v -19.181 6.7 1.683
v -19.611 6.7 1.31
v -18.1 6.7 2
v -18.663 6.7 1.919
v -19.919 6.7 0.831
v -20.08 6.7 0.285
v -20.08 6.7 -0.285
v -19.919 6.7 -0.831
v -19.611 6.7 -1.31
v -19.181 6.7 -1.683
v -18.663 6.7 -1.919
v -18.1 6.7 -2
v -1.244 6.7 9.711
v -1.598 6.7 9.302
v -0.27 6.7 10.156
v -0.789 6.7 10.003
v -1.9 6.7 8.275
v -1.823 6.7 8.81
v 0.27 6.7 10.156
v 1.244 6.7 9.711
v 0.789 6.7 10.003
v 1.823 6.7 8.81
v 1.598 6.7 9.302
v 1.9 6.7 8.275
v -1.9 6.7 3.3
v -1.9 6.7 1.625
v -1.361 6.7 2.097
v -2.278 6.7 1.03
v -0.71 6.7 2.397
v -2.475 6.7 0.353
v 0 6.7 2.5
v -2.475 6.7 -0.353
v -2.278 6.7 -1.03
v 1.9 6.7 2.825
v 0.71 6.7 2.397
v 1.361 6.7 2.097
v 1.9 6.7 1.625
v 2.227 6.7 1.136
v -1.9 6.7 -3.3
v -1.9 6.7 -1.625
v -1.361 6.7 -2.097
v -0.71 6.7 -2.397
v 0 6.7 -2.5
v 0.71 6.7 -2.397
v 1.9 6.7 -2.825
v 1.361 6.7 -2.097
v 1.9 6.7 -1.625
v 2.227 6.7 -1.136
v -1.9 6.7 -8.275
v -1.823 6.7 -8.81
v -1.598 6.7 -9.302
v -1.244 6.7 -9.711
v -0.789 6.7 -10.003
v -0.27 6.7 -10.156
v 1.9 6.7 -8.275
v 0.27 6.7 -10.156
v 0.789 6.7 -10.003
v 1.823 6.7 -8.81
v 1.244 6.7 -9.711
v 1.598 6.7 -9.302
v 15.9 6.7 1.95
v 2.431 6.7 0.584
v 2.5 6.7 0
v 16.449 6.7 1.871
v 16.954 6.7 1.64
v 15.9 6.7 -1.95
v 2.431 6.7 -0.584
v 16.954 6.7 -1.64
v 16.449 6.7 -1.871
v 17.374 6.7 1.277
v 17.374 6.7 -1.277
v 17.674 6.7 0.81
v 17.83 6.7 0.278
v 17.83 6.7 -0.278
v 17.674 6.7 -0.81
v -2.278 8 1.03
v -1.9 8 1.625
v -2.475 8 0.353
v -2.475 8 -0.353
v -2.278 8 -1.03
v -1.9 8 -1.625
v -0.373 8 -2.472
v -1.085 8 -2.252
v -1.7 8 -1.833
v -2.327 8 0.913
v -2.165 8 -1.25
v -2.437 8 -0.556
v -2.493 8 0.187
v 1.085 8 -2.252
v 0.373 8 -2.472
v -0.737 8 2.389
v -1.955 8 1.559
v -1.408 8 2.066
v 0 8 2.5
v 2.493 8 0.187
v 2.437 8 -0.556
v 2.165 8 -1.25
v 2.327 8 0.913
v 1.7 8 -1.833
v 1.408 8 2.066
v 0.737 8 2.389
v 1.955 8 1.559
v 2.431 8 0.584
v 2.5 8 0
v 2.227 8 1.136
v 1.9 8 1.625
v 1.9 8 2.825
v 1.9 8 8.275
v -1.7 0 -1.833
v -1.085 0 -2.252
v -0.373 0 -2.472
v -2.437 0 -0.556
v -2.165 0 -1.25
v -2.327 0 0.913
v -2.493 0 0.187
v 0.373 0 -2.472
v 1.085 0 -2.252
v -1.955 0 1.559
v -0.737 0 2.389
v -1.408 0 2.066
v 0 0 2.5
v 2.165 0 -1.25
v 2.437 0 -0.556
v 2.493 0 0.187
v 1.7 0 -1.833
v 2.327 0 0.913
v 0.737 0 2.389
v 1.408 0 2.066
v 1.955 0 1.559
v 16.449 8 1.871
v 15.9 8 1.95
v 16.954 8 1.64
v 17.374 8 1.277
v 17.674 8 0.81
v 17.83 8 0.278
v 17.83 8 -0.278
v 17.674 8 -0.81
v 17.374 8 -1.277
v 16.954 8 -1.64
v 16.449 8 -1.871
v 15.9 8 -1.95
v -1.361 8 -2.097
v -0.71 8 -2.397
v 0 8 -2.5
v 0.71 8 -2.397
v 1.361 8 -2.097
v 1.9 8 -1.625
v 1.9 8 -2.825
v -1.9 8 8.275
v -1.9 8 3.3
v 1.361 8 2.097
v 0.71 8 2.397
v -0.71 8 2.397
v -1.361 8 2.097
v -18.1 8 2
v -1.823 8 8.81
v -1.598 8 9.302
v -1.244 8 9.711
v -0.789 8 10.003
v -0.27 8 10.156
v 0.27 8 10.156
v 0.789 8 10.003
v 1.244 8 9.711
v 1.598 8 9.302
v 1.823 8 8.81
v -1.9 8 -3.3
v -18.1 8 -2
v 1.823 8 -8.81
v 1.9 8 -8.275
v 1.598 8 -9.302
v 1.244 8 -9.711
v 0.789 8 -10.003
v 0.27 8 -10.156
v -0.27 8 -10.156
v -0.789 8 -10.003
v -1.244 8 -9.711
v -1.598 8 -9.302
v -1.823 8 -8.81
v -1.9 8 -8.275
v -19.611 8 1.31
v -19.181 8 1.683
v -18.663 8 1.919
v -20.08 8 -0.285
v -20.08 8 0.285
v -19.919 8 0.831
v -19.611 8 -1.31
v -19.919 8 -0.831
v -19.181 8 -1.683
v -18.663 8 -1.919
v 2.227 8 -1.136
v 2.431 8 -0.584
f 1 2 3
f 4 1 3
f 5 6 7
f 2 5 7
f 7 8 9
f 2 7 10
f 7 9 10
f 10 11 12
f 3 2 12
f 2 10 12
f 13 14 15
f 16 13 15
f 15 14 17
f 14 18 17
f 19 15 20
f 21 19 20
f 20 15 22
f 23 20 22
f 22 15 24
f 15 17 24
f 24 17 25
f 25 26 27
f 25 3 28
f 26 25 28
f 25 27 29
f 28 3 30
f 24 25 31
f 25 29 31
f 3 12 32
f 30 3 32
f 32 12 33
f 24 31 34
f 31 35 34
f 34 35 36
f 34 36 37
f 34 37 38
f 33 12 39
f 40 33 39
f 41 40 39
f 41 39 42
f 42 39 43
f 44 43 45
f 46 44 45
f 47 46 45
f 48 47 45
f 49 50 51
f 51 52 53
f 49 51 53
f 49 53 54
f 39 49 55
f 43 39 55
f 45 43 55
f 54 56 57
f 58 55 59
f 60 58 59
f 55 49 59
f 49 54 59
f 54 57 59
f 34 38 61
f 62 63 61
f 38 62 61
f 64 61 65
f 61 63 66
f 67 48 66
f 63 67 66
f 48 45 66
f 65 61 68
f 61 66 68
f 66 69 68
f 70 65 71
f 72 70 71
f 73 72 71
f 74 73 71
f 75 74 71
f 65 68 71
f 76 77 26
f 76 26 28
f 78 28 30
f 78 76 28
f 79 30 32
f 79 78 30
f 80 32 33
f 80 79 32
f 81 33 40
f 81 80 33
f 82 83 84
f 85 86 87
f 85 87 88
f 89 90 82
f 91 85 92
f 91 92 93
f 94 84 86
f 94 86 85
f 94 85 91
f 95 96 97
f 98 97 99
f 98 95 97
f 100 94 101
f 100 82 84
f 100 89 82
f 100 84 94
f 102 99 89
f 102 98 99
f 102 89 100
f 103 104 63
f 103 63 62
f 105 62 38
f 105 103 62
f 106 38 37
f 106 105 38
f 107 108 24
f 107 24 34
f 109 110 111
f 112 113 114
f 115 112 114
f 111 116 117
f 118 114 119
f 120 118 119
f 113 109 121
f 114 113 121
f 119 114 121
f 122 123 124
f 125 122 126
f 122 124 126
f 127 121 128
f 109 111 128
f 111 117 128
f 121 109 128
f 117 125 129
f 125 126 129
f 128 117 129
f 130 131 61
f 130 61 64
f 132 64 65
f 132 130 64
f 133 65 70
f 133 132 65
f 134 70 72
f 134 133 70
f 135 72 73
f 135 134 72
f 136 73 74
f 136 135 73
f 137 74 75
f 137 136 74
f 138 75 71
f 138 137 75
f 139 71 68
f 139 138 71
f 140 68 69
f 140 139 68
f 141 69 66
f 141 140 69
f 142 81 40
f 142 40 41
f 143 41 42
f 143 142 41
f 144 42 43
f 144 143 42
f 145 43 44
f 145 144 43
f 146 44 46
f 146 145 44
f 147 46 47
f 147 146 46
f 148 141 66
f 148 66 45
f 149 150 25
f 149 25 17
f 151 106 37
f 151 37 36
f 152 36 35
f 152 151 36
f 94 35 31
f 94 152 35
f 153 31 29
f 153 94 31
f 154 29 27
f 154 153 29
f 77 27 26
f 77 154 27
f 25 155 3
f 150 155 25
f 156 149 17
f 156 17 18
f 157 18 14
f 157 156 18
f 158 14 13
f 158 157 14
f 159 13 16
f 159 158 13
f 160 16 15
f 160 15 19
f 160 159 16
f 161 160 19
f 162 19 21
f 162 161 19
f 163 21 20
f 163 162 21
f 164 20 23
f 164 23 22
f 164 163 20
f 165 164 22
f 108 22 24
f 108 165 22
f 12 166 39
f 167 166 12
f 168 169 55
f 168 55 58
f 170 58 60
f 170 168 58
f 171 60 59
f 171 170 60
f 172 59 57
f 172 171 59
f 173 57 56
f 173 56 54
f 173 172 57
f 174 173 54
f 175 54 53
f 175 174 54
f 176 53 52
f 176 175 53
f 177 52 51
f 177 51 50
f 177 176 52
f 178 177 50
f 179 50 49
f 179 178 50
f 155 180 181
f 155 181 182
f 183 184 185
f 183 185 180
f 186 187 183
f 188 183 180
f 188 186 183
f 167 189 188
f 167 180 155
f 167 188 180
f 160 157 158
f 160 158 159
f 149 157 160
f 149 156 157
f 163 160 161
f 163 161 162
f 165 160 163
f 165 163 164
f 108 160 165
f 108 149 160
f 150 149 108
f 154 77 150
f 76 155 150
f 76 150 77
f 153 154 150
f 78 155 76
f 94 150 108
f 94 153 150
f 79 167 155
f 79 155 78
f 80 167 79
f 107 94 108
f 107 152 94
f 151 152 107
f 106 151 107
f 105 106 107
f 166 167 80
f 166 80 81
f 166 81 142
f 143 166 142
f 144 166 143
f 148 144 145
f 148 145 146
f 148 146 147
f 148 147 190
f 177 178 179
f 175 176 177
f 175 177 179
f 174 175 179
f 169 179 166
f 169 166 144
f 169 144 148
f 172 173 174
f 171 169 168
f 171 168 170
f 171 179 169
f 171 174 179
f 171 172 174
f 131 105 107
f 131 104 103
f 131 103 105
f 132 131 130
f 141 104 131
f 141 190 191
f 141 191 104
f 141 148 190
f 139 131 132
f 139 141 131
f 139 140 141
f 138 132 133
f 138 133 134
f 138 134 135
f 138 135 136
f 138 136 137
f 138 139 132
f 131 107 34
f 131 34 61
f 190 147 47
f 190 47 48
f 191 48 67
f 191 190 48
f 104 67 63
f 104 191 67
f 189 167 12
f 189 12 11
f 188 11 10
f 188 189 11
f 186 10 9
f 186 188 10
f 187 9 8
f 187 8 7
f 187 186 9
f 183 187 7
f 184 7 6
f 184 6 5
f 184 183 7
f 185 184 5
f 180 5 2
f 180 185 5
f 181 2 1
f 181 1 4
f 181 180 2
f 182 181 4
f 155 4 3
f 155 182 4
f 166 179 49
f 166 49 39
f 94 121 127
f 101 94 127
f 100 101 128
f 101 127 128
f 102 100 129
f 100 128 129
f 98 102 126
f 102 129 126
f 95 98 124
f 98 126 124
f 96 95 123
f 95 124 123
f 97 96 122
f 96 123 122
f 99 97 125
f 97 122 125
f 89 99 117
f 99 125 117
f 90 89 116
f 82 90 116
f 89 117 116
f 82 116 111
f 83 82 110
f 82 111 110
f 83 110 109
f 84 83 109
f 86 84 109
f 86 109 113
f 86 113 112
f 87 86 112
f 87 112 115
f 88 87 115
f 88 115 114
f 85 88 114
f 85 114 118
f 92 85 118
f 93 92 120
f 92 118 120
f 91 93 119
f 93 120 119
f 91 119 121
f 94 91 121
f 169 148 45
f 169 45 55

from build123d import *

# Parameters (mm, degrees)
SKETCH1_R           = 2.5
BOSS_EXTRUDE1_DEPTH = 8
SKETCH2_R           = 2
SKETCH2_R_2         = 1.95
BOSS_EXTRUDE2_DEPTH = 1.3


with BuildPart() as part:
    # Sketch1 → Boss-Extrude1 (new body)
    with BuildSketch(Plane(origin=(0, 0, 0), x_dir=(1, 0, 0), z_dir=(0, 1, 0))):
        with Locations(Location((0, 0, 0), (0, 0, 270))):
            Circle(SKETCH1_R)
    extrude(amount=BOSS_EXTRUDE1_DEPTH)


with BuildPart() as body_2:
    # Sketch2 → Boss-Extrude2 (new body)
    with BuildSketch(Plane(origin=(0, 8, 0), x_dir=(1, 0, 0), z_dir=(0, 1, 0))):
        with Locations((-18.1, 0)):
            Circle(SKETCH2_R)
        with BuildLine():
            ThreePointArc((-1.9, -1.624807681), (-2.5, 0), (-1.9, 1.624807681))
            Line((-1.9, 1.624807681), (-1.9, 3.3))
            Line((-1.9, 3.3), (-18.1, 2))
            ThreePointArc((-18.1, 2), (-16.685786438, 1.414213562), (-16.1, 0))
            ThreePointArc((-16.1, 0), (-16.685786438, -1.414213562), (-18.1, -2))
            Line((-18.1, -2), (-1.9, -3.3))
            Line((-1.9, -3.3), (-1.9, -1.624807681))
        make_face()
        with BuildLine():
            Line((1.9, 1.624807681), (1.9, 2.825))
            Line((1.9, 2.825), (1.9, 8.275))
            ThreePointArc((1.9, 8.275), (0, 6.375), (-1.9, 8.275))
            Line((-1.9, 8.275), (-1.9, 3.3))
            Line((-1.9, 3.3), (-1.9, 1.624807681))
            ThreePointArc((-1.9, 1.624807681), (0, 2.5), (1.9, 1.624807681))
        make_face()
        with BuildLine():
            ThreePointArc((-1.9, 8.275), (0, 6.375), (1.9, 8.275))
            Line((1.9, 8.275), (-1.9, 8.275))
        make_face()
        with BuildLine():
            Line((-1.9, 8.275), (1.9, 8.275))
            ThreePointArc((1.9, 8.275), (0, 10.175), (-1.9, 8.275))
        make_face()
        with BuildLine():
            Line((1.9, -2.825), (1.9, -1.624807681))
            ThreePointArc((1.9, -1.624807681), (0, -2.5), (-1.9, -1.624807681))
            Line((-1.9, -1.624807681), (-1.9, -3.3))
            Line((-1.9, -3.3), (-1.9, -8.275))
            ThreePointArc((-1.9, -8.275), (0, -6.375), (1.9, -8.275))
            Line((1.9, -8.275), (1.9, -2.825))
        make_face()
        with BuildLine():
            ThreePointArc((-1.9, -8.275), (0, -10.175), (1.9, -8.275))
            Line((1.9, -8.275), (-1.9, -8.275))
        make_face()
        with BuildLine():
            Line((-1.9, -8.275), (1.9, -8.275))
            ThreePointArc((1.9, -8.275), (0, -6.375), (-1.9, -8.275))
        make_face()
        with BuildLine():
            Line((15.9, 1.95), (1.9, 2.825))
            Line((1.9, 2.825), (1.9, 1.624807681))
            ThreePointArc((1.9, 1.624807681), (2.34520788, 0.866025404), (2.5, 0))
            ThreePointArc((2.5, 0), (2.34520788, -0.866025404), (1.9, -1.624807681))
            Line((1.9, -1.624807681), (1.9, -2.825))
            Line((1.9, -2.825), (15.9, -1.95))
            ThreePointArc((15.9, -1.95), (13.95, 0), (15.9, 1.95))
        make_face()
        with Locations((15.9, 0)):
            Circle(SKETCH2_R_2)
    extrude(amount=-BOSS_EXTRUDE2_DEPTH)


solid = Compound([part.part, body_2.part])
